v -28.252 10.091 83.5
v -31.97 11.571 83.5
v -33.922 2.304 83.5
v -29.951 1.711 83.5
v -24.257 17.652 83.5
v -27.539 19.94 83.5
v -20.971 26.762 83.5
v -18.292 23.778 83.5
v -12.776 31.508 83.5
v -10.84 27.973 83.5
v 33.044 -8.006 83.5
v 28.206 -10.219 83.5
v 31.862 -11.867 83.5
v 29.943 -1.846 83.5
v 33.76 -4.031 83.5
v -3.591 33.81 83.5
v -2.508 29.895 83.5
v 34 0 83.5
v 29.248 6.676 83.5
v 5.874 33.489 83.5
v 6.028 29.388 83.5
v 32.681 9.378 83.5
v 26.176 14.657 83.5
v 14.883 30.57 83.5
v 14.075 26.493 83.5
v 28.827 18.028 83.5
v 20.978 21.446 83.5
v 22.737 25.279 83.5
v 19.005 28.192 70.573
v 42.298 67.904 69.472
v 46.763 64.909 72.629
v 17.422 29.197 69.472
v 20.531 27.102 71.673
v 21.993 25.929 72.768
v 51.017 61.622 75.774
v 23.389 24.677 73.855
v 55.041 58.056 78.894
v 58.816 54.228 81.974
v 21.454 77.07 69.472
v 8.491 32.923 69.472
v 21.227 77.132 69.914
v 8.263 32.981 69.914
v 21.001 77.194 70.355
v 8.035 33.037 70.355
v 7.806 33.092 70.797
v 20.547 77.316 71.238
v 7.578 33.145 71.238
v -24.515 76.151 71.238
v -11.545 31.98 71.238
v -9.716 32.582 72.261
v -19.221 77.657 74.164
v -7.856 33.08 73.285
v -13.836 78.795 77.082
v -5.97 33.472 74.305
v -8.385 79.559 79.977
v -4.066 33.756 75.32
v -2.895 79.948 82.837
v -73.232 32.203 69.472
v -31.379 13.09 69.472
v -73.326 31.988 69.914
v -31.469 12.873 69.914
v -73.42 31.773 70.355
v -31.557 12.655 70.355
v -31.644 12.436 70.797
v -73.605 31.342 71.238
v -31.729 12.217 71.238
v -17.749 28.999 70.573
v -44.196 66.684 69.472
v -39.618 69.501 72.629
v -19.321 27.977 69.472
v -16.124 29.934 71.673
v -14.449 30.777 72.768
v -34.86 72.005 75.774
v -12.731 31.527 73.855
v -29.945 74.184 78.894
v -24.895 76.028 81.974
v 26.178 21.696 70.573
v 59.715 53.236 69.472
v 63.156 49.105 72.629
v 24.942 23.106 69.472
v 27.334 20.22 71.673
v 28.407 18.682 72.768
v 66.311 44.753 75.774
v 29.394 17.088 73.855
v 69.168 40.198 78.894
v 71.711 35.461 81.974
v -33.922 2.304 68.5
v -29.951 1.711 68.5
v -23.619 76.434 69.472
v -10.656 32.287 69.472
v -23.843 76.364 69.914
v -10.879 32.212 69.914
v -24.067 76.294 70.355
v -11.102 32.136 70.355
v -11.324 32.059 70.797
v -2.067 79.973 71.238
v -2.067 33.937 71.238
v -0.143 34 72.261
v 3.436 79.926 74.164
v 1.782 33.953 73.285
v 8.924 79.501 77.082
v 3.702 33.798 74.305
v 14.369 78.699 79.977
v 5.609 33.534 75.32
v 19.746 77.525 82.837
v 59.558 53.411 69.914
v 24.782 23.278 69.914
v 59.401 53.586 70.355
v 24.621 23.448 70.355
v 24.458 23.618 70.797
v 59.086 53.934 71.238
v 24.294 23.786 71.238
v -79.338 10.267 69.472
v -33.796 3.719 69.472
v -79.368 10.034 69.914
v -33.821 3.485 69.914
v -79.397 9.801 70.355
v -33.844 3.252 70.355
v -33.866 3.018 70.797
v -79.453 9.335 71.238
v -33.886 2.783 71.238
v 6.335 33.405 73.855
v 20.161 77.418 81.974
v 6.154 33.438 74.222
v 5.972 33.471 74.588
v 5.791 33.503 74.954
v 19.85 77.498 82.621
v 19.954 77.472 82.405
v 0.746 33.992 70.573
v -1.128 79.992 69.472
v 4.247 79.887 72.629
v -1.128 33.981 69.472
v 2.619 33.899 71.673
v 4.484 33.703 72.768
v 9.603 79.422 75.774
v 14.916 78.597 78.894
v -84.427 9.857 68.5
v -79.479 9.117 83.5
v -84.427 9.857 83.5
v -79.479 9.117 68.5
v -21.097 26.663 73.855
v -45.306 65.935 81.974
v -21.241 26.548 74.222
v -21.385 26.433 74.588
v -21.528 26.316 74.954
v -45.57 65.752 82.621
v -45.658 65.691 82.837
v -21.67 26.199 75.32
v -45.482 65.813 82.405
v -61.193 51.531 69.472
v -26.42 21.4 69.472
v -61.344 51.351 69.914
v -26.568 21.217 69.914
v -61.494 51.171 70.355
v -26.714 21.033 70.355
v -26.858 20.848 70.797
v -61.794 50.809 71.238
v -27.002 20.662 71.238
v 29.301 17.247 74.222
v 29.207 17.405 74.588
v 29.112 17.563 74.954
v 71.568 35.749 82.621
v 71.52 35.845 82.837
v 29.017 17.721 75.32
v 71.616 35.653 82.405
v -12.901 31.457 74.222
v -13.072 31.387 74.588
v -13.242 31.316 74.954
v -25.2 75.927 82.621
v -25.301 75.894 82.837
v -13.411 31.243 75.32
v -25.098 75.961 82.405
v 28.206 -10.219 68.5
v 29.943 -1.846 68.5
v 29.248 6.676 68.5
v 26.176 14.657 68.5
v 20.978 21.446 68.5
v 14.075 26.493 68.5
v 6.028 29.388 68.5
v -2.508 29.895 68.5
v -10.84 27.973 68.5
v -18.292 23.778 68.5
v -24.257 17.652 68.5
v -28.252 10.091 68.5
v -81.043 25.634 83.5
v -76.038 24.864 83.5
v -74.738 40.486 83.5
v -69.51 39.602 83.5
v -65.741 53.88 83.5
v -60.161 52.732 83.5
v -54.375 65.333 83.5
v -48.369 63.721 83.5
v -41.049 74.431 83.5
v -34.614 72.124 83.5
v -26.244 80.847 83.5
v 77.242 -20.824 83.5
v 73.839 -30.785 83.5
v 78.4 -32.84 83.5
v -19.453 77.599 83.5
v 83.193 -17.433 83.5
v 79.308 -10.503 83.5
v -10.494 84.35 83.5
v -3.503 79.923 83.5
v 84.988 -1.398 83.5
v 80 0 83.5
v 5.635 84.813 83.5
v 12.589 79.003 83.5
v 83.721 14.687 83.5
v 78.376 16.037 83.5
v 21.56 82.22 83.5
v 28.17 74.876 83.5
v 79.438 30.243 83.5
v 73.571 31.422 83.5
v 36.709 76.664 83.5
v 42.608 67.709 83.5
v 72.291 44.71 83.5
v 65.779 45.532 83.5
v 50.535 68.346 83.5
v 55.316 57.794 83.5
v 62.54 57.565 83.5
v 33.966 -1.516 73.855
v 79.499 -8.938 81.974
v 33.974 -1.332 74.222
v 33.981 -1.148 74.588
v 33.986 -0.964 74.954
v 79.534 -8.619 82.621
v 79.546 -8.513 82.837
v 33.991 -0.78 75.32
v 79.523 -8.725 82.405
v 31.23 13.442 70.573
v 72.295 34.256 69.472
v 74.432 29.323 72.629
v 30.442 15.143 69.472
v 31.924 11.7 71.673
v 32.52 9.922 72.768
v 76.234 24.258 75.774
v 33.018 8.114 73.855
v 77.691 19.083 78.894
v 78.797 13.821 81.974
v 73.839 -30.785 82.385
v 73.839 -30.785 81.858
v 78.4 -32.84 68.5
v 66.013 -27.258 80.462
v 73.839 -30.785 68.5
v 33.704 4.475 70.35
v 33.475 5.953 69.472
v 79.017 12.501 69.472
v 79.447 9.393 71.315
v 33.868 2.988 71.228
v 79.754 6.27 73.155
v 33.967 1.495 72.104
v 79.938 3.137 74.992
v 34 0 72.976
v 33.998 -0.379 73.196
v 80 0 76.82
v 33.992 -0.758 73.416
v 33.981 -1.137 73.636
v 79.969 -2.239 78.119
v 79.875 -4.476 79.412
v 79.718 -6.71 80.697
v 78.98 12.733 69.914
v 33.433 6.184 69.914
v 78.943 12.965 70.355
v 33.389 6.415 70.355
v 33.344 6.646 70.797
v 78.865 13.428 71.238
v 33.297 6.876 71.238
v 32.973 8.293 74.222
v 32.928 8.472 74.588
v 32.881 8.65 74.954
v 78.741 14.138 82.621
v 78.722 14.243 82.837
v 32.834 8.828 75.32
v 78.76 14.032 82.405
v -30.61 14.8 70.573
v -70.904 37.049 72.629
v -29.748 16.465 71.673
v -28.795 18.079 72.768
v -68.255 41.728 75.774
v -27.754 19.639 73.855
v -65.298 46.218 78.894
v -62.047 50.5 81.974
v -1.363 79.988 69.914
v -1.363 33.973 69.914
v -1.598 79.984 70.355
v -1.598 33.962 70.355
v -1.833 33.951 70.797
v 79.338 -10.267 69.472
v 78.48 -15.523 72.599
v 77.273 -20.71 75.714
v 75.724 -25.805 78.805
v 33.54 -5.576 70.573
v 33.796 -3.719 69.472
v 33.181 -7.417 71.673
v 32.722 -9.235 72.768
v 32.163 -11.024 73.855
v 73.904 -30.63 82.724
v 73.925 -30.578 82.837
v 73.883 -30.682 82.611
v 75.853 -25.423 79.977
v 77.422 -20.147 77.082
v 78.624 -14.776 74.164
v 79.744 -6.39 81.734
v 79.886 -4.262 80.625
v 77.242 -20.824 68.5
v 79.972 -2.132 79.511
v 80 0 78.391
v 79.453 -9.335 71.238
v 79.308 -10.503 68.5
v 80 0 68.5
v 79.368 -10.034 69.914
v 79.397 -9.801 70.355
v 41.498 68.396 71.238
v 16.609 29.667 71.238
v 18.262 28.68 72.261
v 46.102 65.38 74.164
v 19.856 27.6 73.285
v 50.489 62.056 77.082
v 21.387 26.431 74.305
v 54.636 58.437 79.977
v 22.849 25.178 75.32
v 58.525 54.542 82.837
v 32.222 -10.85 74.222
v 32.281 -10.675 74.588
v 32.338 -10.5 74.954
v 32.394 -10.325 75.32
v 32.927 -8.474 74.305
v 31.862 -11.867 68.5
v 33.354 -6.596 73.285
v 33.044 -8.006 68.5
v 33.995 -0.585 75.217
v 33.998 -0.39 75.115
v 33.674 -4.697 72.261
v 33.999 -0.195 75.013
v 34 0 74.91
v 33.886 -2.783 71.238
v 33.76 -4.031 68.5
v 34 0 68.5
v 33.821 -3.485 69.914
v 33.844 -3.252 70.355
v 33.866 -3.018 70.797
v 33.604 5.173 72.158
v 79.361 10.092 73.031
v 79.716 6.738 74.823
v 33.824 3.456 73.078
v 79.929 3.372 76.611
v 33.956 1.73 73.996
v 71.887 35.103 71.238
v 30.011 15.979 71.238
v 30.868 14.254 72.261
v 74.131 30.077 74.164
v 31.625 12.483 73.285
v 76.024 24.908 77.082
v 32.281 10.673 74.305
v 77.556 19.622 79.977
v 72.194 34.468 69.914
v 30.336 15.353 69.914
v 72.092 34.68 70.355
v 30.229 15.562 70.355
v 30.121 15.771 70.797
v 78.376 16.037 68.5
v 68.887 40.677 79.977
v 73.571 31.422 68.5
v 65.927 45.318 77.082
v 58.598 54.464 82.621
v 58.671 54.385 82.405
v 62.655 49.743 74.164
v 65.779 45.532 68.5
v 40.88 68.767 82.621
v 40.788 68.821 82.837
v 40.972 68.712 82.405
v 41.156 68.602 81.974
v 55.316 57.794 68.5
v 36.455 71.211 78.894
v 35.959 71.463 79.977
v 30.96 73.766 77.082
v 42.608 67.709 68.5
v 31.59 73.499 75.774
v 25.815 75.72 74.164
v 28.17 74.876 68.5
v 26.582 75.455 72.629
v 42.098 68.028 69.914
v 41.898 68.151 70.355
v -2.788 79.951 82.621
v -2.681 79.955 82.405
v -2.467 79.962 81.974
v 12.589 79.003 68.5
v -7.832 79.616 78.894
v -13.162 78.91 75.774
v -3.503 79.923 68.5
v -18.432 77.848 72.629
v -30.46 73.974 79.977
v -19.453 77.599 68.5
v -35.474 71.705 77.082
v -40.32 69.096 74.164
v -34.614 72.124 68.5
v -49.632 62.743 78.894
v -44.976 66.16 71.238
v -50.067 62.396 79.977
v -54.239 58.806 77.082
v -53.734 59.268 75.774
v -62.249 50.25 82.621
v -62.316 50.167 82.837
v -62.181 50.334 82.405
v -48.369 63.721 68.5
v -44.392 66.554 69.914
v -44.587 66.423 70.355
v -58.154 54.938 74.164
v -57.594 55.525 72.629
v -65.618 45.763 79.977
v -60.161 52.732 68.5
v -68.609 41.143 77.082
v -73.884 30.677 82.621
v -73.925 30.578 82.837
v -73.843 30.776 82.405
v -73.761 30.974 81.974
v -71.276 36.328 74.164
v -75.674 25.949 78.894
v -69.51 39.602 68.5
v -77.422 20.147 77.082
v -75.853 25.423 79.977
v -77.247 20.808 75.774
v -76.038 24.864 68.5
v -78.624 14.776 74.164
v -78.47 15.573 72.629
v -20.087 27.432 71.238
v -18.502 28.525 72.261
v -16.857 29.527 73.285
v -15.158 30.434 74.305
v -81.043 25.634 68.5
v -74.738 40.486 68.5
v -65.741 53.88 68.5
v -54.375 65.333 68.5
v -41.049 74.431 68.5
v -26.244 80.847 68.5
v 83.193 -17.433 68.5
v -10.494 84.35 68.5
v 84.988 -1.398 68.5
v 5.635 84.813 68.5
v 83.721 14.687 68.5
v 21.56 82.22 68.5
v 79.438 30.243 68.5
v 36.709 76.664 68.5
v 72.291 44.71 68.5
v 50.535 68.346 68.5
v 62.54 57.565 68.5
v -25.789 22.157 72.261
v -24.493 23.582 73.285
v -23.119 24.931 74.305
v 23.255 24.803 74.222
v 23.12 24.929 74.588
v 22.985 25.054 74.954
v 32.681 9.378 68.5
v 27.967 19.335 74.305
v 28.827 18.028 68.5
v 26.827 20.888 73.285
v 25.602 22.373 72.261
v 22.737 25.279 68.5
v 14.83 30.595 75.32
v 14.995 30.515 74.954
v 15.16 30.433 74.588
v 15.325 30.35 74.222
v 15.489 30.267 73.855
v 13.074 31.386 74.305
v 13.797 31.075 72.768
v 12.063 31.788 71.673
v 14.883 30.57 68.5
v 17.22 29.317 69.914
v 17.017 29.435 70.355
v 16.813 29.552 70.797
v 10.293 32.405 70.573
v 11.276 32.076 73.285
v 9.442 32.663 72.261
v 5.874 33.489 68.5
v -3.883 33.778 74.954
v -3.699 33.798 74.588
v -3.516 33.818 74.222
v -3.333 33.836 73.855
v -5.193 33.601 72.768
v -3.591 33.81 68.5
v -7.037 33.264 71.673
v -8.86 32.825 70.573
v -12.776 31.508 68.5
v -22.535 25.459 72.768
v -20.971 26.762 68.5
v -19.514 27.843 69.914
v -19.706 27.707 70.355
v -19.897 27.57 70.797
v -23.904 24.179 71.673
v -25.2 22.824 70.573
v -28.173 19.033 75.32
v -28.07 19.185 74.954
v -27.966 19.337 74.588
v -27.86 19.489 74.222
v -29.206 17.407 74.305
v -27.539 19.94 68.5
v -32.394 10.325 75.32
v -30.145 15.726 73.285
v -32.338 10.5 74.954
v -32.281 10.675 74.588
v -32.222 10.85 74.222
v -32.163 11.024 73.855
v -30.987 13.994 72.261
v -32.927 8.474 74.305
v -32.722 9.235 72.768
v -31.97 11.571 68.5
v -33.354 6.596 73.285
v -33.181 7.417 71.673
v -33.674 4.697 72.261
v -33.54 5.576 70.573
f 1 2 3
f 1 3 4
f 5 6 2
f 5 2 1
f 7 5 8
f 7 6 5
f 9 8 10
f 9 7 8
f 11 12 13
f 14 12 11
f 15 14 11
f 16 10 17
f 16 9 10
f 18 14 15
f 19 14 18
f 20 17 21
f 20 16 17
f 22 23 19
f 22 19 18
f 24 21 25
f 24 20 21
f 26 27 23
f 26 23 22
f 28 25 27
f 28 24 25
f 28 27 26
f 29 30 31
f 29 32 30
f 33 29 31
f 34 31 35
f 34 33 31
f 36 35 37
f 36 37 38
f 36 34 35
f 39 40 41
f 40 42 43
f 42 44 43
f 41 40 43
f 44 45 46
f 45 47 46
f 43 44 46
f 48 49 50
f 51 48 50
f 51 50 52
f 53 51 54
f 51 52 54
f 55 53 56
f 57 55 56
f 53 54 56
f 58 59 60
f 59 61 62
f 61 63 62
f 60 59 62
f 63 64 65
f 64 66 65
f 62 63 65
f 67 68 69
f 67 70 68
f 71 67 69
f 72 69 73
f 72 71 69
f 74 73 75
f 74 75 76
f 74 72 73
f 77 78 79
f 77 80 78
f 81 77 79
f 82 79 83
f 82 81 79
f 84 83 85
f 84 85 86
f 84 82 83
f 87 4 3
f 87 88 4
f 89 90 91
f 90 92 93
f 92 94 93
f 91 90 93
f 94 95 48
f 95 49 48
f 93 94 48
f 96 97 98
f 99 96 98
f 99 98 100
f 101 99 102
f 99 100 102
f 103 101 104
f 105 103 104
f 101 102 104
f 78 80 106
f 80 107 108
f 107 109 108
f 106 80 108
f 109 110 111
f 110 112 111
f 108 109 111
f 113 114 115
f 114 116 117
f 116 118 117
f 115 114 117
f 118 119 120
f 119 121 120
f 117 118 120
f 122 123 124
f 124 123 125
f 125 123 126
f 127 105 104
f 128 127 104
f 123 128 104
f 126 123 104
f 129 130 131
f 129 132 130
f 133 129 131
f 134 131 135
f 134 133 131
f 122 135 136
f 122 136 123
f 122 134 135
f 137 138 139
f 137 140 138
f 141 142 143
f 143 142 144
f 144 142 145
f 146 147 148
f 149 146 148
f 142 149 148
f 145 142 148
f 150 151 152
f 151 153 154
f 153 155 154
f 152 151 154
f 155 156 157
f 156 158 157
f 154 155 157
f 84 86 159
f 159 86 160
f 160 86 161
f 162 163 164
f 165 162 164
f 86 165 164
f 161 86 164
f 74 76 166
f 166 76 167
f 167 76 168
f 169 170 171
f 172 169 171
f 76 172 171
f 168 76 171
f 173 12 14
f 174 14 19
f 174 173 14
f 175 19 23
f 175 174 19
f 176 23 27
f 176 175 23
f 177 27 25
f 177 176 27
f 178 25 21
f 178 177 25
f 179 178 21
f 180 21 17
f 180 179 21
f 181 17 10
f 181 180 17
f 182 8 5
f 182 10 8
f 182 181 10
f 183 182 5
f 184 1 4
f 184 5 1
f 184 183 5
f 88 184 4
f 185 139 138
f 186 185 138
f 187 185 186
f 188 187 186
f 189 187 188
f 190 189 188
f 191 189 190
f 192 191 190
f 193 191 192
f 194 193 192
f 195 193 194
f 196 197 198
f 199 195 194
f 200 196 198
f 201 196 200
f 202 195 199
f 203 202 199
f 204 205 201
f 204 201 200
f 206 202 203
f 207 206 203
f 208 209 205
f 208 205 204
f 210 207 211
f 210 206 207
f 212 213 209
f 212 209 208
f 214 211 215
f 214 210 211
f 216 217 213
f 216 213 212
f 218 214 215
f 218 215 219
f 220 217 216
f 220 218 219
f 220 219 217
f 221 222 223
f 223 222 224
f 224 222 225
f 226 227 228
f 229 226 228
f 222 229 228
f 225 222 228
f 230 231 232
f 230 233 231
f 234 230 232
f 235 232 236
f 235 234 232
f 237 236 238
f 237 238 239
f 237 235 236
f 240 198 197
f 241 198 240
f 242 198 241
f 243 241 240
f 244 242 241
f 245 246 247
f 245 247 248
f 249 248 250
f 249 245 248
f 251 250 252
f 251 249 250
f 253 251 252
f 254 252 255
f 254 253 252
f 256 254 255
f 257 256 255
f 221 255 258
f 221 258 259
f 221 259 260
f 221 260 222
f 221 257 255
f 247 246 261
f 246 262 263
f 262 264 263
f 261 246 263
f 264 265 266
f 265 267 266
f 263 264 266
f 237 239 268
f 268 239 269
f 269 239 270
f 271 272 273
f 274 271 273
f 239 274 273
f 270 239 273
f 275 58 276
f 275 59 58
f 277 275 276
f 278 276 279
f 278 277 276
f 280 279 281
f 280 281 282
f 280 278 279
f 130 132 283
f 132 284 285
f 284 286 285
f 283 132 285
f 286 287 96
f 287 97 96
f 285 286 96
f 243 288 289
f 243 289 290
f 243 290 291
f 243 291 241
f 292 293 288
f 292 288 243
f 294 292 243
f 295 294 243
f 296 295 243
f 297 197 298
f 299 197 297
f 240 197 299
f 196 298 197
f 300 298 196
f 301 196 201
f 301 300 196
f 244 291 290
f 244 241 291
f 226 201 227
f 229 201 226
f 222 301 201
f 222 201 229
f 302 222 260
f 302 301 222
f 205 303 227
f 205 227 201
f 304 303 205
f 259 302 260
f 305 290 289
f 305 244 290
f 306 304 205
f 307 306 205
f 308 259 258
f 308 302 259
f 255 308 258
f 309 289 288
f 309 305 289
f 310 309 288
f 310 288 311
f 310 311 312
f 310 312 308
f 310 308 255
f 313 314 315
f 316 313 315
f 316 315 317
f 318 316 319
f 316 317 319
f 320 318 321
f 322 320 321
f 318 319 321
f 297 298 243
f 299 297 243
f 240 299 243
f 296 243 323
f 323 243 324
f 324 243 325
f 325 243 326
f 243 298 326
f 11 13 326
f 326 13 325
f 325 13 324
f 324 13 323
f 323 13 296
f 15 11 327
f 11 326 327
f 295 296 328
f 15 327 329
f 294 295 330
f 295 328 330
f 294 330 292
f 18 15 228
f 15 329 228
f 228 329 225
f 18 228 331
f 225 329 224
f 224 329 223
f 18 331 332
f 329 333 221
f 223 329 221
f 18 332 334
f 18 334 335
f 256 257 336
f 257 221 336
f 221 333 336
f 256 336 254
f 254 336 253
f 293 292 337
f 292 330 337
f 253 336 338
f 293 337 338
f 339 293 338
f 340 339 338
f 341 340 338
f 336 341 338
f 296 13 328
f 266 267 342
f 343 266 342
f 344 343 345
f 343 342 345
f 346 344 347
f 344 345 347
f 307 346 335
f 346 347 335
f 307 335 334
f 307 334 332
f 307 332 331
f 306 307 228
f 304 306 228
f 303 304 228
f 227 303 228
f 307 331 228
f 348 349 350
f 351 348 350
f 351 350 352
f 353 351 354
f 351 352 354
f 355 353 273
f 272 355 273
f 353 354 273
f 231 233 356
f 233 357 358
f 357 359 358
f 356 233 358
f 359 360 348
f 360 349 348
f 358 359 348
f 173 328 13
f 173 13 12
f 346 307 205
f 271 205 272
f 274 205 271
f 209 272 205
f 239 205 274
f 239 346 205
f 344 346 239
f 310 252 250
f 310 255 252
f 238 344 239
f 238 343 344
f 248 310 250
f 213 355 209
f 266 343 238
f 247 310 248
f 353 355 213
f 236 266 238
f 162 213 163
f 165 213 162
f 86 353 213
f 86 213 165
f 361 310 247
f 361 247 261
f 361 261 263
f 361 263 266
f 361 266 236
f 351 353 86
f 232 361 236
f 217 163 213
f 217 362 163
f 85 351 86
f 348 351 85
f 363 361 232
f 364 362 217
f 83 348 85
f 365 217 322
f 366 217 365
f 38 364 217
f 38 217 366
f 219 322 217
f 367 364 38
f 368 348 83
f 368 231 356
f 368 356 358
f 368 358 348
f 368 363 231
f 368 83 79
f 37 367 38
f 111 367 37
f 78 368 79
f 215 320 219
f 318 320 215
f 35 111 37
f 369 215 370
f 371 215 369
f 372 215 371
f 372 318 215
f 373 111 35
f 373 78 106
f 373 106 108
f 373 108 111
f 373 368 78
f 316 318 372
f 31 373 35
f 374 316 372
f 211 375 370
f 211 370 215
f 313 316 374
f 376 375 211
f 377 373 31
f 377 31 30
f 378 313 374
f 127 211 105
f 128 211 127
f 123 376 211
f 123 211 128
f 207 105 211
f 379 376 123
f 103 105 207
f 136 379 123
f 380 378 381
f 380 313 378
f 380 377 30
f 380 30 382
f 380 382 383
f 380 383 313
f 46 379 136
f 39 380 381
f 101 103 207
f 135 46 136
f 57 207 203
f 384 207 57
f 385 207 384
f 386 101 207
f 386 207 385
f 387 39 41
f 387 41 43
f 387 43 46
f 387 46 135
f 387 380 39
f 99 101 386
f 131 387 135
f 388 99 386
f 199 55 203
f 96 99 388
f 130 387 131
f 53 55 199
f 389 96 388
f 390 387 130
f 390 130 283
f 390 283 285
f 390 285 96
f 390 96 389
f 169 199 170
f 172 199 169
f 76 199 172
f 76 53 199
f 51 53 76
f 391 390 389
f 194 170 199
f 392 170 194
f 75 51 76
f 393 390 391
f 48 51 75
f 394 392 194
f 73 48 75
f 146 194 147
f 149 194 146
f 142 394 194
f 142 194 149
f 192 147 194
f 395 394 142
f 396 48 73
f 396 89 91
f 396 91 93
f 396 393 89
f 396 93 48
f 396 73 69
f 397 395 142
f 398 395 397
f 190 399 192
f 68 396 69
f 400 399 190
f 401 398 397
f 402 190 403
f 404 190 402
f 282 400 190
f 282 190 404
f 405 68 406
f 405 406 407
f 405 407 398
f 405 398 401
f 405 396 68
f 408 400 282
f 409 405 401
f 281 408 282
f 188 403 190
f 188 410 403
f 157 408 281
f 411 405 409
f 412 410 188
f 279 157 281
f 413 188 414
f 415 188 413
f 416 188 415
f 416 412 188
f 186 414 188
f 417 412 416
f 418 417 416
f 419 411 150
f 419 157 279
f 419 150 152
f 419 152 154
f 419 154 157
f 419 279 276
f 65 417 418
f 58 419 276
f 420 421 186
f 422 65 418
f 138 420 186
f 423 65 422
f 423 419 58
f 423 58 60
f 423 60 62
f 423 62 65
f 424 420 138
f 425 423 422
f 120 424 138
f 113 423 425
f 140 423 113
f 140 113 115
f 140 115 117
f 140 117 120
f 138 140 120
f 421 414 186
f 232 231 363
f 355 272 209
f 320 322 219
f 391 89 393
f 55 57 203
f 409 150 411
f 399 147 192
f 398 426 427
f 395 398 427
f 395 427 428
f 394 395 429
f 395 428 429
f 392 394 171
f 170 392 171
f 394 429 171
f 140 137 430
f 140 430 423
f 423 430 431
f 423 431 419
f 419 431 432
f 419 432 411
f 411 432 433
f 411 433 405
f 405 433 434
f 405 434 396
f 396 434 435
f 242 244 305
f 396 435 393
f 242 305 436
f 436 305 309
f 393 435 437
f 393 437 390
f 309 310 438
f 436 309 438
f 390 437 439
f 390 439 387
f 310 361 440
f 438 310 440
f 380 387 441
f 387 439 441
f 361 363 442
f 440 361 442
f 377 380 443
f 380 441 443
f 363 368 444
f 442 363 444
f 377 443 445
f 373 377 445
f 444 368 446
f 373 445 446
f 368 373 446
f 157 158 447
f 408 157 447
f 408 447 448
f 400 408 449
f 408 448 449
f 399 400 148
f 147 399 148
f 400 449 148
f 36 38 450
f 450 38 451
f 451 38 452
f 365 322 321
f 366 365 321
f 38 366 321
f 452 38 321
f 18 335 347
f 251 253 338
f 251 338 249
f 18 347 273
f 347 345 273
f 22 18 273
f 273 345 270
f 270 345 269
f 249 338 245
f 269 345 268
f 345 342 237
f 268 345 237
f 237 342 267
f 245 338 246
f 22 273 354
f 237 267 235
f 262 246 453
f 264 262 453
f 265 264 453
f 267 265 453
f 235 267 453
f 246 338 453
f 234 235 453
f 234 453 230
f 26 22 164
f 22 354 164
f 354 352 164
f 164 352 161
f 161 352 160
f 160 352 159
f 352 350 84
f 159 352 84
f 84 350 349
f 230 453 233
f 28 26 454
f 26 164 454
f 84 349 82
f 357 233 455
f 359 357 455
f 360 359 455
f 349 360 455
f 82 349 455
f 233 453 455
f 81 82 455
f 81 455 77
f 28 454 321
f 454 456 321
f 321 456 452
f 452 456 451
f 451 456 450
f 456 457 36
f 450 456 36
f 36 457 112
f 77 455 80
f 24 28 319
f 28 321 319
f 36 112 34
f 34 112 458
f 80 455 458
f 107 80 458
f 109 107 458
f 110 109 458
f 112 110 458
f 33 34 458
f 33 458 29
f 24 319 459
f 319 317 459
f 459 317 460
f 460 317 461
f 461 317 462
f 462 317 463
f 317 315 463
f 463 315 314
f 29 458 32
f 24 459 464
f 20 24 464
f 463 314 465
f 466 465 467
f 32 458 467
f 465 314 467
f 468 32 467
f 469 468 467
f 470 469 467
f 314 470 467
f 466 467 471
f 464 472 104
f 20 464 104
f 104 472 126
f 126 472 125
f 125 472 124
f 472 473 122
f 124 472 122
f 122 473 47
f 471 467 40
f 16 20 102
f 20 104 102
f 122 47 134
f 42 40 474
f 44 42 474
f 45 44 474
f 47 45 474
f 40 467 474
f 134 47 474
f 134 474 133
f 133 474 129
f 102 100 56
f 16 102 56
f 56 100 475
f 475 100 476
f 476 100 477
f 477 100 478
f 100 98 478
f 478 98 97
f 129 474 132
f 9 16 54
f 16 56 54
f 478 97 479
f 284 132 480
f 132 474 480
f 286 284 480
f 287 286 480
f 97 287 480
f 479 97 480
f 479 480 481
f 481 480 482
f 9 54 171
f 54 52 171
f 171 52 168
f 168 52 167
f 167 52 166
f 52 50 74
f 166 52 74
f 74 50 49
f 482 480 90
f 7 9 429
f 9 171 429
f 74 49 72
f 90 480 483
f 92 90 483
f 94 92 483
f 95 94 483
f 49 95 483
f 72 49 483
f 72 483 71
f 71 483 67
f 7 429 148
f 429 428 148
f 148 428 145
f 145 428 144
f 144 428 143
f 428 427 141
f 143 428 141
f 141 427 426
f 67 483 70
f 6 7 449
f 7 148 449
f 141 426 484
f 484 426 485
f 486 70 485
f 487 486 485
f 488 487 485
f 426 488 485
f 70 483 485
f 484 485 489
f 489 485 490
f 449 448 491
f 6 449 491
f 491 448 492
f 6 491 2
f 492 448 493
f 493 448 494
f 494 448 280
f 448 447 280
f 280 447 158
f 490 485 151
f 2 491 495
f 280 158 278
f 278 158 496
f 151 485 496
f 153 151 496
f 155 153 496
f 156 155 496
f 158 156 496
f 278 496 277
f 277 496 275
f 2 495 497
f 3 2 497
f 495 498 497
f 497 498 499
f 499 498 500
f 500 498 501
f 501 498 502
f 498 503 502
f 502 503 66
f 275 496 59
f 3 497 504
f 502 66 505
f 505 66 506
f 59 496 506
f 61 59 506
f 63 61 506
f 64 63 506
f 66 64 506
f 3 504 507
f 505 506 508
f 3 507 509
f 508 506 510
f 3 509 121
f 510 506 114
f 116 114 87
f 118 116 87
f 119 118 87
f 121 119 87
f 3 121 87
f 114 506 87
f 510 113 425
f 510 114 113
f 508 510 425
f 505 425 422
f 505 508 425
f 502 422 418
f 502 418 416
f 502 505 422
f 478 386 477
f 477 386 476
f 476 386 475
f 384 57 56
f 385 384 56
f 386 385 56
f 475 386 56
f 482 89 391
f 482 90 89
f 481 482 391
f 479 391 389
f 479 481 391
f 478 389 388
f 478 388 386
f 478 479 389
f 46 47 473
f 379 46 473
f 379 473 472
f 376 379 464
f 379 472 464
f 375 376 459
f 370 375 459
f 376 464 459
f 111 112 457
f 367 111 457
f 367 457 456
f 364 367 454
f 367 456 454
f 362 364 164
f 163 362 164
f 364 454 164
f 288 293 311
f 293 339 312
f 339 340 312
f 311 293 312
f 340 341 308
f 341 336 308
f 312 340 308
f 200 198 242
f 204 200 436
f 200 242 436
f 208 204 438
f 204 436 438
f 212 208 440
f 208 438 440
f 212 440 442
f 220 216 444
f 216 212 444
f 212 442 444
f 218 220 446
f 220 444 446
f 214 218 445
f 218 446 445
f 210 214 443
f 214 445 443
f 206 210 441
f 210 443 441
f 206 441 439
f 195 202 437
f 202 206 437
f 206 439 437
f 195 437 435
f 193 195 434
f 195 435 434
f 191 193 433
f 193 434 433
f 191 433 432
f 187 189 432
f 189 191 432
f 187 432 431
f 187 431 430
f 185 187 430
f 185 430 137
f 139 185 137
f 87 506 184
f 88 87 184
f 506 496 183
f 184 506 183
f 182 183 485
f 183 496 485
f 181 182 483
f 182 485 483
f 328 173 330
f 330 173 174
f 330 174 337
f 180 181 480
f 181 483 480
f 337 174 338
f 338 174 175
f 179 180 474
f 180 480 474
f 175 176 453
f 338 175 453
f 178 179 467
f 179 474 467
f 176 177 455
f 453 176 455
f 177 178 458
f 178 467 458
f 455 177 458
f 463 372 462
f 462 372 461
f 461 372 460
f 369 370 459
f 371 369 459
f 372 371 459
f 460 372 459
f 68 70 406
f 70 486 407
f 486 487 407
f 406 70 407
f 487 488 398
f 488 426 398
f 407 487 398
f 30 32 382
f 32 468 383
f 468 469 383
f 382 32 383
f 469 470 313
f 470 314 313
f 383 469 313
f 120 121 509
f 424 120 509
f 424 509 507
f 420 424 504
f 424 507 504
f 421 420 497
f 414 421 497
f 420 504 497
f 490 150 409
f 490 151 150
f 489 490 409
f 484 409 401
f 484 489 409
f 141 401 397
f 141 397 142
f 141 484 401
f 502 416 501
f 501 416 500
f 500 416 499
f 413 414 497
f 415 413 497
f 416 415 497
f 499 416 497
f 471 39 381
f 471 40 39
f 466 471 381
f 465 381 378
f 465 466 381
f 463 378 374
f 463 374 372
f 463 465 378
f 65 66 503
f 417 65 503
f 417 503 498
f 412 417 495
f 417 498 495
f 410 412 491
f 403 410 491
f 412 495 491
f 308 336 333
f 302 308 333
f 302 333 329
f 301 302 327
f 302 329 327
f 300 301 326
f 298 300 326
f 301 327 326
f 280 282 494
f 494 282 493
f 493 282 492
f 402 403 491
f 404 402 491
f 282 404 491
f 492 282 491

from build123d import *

# Parameters (mm, degrees)
PAD037_DEPTH              = 200
TUBE039_R                 = 100
TUBE039_R_2               = 80
TUBE039_DEPTH             = 200
PAD038_DEPTH              = 100
PAD039_DEPTH              = 2
COMMON018_PLACEMENT_ANGLE = 28
ARRAY016_COUNT            = 22
ARRAY016_PLACEMENT_ANGLE  = 180
TUBE040_R                 = 85
TUBE040_R_2               = 80
TUBE040_DEPTH             = 15
TUBE041_R                 = 34
TUBE041_R_2               = 30
TUBE041_DEPTH             = 15


with BuildPart() as body038:
    # Sketch037 → Pad037 (new body)
    with BuildSketch(Plane.XY):
        Polygon((-29.110853, 1.584928), (-96.197479, 11.61747), (-96.197479, -126.516327), (86.349205, -133.978043), (86.349205, -36.423061), (25.978256, -9.215396), align=None)
    extrude(amount=PAD037_DEPTH)


with BuildPart() as tube039:
    # Tube039 → Tube039 (new body)
    with BuildSketch(Plane.XY):
        Circle(TUBE039_R)
        Circle(TUBE039_R_2, mode=Mode.SUBTRACT)
    extrude(amount=TUBE039_DEPTH)


with BuildPart() as body039:
    # Sketch038 → Pad038 (new body)
    with BuildSketch(Plane.XZ):
        Polygon((0, 0), (0, 2), (26, 0.9), (26, 0), align=None)
    extrude(amount=PAD038_DEPTH)


with BuildPart() as body039_1:
    # Body039 placement: moved
    add(body039.part.moved(Location((-5, 0, 5))))


with BuildPart() as cut012:
    # Sketch039 → Pad039 (new body)
    with BuildSketch(Plane.XY):
        Polygon((0, 0), (0, -52), (25.94305, -47.924315), (8.5, 0), align=None)
    extrude(amount=PAD039_DEPTH)


with BuildPart() as cut012_1:
    # Body040 placement: moved
    add(cut012.part.moved(Location((-5, -33, 5))))

    # Common018: intersect Body039
    add(body039_1.part, mode=Mode.INTERSECT)


with BuildPart() as cut012_2:
    # Common018 placement: moved
    add(cut012_1.part.rotate(Axis((0, 0, 0), (0, 1, 0)), COMMON018_PLACEMENT_ANGLE))

    # Array016: Cut012 ×22 about axis
    array016_axis = Axis((0, 0, 0), (0, 0, 1))


with BuildPart() as cut012_3:
    add(cut012_2.part)
    for i in range(1, ARRAY016_COUNT):
        add(cut012_2.part.rotate(array016_axis, i * 360 / ARRAY016_COUNT))


with BuildPart() as cut012_4:
    # Array016 placement: moved
    add(cut012_3.part.moved(Location((0, 0, 78))).rotate(Axis((0, 0, 78), (0, 1, 0)), ARRAY016_PLACEMENT_ANGLE))

    # Cut012: cut Tube039
    add(tube039.part, mode=Mode.SUBTRACT)


with BuildPart() as tube040:
    # Tube040 → Tube040 (new body)
    with BuildSketch(Plane.XY.offset(68.5)):
        Circle(TUBE040_R)
        Circle(TUBE040_R_2, mode=Mode.SUBTRACT)
    extrude(amount=TUBE040_DEPTH)


with BuildPart() as stator2h2:
    # Tube041 → Tube041 (new body)
    with BuildSketch(Plane.XY.offset(68.5)):
        Circle(TUBE041_R)
        Circle(TUBE041_R_2, mode=Mode.SUBTRACT)
    extrude(amount=TUBE041_DEPTH)

    # Fusion018: union Cut012, Tube040
    add(cut012_4.part)
    add(tube040.part)

    # Cut013: cut Body038
    add(body038.part, mode=Mode.SUBTRACT)


solid = stator2h2.part
